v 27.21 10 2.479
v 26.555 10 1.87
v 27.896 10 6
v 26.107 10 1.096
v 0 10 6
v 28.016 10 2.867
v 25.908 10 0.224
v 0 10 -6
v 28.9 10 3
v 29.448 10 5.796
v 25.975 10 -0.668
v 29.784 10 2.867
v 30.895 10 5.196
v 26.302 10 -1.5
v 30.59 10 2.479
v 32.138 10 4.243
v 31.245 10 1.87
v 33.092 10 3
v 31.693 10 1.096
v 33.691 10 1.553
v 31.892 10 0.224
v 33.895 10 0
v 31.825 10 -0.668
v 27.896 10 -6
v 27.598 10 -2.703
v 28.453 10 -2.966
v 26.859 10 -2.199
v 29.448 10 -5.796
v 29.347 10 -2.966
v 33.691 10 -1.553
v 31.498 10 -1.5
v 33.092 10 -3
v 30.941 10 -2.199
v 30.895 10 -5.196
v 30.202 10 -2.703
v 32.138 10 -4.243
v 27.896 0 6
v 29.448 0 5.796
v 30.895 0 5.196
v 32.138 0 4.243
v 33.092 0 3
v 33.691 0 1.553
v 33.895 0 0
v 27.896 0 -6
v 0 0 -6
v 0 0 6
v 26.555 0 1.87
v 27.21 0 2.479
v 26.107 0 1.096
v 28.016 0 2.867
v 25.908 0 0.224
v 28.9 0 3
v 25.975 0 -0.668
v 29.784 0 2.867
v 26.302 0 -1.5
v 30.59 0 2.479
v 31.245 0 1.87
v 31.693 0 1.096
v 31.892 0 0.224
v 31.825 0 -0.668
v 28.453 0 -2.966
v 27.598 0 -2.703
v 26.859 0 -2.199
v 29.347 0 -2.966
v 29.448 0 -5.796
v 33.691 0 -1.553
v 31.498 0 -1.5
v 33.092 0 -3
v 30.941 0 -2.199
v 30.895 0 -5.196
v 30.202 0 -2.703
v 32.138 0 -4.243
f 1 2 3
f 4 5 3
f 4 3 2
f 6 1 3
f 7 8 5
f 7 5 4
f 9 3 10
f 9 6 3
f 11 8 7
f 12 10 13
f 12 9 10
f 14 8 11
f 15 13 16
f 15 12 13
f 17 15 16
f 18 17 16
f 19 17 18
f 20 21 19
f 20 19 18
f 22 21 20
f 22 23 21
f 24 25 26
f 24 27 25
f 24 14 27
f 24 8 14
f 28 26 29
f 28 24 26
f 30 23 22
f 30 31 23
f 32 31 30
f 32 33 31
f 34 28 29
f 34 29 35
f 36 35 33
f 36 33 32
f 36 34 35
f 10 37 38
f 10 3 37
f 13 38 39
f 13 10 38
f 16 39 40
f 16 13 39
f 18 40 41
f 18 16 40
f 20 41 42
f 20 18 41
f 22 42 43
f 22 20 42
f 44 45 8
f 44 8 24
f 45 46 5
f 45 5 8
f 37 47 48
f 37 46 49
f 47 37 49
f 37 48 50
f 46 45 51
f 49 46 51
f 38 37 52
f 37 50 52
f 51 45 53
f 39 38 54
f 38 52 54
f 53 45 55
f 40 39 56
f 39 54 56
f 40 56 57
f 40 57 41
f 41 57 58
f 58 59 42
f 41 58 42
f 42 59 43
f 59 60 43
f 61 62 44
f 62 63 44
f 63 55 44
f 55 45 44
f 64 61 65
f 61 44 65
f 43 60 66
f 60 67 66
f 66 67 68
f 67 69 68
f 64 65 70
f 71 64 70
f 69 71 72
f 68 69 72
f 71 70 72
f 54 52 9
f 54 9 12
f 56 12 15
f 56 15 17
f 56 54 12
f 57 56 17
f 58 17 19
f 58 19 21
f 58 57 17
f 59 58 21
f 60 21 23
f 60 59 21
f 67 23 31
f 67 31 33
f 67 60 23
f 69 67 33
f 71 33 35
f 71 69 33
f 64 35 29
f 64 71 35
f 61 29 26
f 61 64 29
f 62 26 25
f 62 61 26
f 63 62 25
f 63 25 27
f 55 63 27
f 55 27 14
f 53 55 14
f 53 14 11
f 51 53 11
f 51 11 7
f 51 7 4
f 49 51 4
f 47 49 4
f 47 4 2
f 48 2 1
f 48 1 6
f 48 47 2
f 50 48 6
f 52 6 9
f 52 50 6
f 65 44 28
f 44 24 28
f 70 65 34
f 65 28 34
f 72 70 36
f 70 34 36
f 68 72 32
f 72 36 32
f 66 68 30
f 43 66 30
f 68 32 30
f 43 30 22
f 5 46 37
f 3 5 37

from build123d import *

# Parameters (mm, degrees)
SKETCH1_W           = 33.895402138
SKETCH1_H           = 12
SKETCH1_R           = 3
BOSS_EXTRUDE1_DEPTH = 10
FILLET1_R           = 6


with BuildPart() as part:
    # Sketch1 → Boss-Extrude1 (new body)
    with BuildSketch(Plane(origin=(0, 0, 0), x_dir=(1, 0, 0), z_dir=(0, 1, 0))):
        with Locations((16.947701069, 0)):
            Rectangle(SKETCH1_W, SKETCH1_H)
        with Locations(Location((28.9, 0, 0), (0, 0, 270))):
            Circle(SKETCH1_R, mode=Mode.SUBTRACT)
    extrude(amount=BOSS_EXTRUDE1_DEPTH)

    # Fillet1
    fillet1_edges = [part.edges().sort_by_distance(p)[0] for p in [
        (33.895402138, 5, -6),
        (33.895402138, 5, 6),
    ]]
    fillet(fillet1_edges, radius=FILLET1_R - 0.0001)  # a hair under: the kernel refuses the full size


solid = part.part
